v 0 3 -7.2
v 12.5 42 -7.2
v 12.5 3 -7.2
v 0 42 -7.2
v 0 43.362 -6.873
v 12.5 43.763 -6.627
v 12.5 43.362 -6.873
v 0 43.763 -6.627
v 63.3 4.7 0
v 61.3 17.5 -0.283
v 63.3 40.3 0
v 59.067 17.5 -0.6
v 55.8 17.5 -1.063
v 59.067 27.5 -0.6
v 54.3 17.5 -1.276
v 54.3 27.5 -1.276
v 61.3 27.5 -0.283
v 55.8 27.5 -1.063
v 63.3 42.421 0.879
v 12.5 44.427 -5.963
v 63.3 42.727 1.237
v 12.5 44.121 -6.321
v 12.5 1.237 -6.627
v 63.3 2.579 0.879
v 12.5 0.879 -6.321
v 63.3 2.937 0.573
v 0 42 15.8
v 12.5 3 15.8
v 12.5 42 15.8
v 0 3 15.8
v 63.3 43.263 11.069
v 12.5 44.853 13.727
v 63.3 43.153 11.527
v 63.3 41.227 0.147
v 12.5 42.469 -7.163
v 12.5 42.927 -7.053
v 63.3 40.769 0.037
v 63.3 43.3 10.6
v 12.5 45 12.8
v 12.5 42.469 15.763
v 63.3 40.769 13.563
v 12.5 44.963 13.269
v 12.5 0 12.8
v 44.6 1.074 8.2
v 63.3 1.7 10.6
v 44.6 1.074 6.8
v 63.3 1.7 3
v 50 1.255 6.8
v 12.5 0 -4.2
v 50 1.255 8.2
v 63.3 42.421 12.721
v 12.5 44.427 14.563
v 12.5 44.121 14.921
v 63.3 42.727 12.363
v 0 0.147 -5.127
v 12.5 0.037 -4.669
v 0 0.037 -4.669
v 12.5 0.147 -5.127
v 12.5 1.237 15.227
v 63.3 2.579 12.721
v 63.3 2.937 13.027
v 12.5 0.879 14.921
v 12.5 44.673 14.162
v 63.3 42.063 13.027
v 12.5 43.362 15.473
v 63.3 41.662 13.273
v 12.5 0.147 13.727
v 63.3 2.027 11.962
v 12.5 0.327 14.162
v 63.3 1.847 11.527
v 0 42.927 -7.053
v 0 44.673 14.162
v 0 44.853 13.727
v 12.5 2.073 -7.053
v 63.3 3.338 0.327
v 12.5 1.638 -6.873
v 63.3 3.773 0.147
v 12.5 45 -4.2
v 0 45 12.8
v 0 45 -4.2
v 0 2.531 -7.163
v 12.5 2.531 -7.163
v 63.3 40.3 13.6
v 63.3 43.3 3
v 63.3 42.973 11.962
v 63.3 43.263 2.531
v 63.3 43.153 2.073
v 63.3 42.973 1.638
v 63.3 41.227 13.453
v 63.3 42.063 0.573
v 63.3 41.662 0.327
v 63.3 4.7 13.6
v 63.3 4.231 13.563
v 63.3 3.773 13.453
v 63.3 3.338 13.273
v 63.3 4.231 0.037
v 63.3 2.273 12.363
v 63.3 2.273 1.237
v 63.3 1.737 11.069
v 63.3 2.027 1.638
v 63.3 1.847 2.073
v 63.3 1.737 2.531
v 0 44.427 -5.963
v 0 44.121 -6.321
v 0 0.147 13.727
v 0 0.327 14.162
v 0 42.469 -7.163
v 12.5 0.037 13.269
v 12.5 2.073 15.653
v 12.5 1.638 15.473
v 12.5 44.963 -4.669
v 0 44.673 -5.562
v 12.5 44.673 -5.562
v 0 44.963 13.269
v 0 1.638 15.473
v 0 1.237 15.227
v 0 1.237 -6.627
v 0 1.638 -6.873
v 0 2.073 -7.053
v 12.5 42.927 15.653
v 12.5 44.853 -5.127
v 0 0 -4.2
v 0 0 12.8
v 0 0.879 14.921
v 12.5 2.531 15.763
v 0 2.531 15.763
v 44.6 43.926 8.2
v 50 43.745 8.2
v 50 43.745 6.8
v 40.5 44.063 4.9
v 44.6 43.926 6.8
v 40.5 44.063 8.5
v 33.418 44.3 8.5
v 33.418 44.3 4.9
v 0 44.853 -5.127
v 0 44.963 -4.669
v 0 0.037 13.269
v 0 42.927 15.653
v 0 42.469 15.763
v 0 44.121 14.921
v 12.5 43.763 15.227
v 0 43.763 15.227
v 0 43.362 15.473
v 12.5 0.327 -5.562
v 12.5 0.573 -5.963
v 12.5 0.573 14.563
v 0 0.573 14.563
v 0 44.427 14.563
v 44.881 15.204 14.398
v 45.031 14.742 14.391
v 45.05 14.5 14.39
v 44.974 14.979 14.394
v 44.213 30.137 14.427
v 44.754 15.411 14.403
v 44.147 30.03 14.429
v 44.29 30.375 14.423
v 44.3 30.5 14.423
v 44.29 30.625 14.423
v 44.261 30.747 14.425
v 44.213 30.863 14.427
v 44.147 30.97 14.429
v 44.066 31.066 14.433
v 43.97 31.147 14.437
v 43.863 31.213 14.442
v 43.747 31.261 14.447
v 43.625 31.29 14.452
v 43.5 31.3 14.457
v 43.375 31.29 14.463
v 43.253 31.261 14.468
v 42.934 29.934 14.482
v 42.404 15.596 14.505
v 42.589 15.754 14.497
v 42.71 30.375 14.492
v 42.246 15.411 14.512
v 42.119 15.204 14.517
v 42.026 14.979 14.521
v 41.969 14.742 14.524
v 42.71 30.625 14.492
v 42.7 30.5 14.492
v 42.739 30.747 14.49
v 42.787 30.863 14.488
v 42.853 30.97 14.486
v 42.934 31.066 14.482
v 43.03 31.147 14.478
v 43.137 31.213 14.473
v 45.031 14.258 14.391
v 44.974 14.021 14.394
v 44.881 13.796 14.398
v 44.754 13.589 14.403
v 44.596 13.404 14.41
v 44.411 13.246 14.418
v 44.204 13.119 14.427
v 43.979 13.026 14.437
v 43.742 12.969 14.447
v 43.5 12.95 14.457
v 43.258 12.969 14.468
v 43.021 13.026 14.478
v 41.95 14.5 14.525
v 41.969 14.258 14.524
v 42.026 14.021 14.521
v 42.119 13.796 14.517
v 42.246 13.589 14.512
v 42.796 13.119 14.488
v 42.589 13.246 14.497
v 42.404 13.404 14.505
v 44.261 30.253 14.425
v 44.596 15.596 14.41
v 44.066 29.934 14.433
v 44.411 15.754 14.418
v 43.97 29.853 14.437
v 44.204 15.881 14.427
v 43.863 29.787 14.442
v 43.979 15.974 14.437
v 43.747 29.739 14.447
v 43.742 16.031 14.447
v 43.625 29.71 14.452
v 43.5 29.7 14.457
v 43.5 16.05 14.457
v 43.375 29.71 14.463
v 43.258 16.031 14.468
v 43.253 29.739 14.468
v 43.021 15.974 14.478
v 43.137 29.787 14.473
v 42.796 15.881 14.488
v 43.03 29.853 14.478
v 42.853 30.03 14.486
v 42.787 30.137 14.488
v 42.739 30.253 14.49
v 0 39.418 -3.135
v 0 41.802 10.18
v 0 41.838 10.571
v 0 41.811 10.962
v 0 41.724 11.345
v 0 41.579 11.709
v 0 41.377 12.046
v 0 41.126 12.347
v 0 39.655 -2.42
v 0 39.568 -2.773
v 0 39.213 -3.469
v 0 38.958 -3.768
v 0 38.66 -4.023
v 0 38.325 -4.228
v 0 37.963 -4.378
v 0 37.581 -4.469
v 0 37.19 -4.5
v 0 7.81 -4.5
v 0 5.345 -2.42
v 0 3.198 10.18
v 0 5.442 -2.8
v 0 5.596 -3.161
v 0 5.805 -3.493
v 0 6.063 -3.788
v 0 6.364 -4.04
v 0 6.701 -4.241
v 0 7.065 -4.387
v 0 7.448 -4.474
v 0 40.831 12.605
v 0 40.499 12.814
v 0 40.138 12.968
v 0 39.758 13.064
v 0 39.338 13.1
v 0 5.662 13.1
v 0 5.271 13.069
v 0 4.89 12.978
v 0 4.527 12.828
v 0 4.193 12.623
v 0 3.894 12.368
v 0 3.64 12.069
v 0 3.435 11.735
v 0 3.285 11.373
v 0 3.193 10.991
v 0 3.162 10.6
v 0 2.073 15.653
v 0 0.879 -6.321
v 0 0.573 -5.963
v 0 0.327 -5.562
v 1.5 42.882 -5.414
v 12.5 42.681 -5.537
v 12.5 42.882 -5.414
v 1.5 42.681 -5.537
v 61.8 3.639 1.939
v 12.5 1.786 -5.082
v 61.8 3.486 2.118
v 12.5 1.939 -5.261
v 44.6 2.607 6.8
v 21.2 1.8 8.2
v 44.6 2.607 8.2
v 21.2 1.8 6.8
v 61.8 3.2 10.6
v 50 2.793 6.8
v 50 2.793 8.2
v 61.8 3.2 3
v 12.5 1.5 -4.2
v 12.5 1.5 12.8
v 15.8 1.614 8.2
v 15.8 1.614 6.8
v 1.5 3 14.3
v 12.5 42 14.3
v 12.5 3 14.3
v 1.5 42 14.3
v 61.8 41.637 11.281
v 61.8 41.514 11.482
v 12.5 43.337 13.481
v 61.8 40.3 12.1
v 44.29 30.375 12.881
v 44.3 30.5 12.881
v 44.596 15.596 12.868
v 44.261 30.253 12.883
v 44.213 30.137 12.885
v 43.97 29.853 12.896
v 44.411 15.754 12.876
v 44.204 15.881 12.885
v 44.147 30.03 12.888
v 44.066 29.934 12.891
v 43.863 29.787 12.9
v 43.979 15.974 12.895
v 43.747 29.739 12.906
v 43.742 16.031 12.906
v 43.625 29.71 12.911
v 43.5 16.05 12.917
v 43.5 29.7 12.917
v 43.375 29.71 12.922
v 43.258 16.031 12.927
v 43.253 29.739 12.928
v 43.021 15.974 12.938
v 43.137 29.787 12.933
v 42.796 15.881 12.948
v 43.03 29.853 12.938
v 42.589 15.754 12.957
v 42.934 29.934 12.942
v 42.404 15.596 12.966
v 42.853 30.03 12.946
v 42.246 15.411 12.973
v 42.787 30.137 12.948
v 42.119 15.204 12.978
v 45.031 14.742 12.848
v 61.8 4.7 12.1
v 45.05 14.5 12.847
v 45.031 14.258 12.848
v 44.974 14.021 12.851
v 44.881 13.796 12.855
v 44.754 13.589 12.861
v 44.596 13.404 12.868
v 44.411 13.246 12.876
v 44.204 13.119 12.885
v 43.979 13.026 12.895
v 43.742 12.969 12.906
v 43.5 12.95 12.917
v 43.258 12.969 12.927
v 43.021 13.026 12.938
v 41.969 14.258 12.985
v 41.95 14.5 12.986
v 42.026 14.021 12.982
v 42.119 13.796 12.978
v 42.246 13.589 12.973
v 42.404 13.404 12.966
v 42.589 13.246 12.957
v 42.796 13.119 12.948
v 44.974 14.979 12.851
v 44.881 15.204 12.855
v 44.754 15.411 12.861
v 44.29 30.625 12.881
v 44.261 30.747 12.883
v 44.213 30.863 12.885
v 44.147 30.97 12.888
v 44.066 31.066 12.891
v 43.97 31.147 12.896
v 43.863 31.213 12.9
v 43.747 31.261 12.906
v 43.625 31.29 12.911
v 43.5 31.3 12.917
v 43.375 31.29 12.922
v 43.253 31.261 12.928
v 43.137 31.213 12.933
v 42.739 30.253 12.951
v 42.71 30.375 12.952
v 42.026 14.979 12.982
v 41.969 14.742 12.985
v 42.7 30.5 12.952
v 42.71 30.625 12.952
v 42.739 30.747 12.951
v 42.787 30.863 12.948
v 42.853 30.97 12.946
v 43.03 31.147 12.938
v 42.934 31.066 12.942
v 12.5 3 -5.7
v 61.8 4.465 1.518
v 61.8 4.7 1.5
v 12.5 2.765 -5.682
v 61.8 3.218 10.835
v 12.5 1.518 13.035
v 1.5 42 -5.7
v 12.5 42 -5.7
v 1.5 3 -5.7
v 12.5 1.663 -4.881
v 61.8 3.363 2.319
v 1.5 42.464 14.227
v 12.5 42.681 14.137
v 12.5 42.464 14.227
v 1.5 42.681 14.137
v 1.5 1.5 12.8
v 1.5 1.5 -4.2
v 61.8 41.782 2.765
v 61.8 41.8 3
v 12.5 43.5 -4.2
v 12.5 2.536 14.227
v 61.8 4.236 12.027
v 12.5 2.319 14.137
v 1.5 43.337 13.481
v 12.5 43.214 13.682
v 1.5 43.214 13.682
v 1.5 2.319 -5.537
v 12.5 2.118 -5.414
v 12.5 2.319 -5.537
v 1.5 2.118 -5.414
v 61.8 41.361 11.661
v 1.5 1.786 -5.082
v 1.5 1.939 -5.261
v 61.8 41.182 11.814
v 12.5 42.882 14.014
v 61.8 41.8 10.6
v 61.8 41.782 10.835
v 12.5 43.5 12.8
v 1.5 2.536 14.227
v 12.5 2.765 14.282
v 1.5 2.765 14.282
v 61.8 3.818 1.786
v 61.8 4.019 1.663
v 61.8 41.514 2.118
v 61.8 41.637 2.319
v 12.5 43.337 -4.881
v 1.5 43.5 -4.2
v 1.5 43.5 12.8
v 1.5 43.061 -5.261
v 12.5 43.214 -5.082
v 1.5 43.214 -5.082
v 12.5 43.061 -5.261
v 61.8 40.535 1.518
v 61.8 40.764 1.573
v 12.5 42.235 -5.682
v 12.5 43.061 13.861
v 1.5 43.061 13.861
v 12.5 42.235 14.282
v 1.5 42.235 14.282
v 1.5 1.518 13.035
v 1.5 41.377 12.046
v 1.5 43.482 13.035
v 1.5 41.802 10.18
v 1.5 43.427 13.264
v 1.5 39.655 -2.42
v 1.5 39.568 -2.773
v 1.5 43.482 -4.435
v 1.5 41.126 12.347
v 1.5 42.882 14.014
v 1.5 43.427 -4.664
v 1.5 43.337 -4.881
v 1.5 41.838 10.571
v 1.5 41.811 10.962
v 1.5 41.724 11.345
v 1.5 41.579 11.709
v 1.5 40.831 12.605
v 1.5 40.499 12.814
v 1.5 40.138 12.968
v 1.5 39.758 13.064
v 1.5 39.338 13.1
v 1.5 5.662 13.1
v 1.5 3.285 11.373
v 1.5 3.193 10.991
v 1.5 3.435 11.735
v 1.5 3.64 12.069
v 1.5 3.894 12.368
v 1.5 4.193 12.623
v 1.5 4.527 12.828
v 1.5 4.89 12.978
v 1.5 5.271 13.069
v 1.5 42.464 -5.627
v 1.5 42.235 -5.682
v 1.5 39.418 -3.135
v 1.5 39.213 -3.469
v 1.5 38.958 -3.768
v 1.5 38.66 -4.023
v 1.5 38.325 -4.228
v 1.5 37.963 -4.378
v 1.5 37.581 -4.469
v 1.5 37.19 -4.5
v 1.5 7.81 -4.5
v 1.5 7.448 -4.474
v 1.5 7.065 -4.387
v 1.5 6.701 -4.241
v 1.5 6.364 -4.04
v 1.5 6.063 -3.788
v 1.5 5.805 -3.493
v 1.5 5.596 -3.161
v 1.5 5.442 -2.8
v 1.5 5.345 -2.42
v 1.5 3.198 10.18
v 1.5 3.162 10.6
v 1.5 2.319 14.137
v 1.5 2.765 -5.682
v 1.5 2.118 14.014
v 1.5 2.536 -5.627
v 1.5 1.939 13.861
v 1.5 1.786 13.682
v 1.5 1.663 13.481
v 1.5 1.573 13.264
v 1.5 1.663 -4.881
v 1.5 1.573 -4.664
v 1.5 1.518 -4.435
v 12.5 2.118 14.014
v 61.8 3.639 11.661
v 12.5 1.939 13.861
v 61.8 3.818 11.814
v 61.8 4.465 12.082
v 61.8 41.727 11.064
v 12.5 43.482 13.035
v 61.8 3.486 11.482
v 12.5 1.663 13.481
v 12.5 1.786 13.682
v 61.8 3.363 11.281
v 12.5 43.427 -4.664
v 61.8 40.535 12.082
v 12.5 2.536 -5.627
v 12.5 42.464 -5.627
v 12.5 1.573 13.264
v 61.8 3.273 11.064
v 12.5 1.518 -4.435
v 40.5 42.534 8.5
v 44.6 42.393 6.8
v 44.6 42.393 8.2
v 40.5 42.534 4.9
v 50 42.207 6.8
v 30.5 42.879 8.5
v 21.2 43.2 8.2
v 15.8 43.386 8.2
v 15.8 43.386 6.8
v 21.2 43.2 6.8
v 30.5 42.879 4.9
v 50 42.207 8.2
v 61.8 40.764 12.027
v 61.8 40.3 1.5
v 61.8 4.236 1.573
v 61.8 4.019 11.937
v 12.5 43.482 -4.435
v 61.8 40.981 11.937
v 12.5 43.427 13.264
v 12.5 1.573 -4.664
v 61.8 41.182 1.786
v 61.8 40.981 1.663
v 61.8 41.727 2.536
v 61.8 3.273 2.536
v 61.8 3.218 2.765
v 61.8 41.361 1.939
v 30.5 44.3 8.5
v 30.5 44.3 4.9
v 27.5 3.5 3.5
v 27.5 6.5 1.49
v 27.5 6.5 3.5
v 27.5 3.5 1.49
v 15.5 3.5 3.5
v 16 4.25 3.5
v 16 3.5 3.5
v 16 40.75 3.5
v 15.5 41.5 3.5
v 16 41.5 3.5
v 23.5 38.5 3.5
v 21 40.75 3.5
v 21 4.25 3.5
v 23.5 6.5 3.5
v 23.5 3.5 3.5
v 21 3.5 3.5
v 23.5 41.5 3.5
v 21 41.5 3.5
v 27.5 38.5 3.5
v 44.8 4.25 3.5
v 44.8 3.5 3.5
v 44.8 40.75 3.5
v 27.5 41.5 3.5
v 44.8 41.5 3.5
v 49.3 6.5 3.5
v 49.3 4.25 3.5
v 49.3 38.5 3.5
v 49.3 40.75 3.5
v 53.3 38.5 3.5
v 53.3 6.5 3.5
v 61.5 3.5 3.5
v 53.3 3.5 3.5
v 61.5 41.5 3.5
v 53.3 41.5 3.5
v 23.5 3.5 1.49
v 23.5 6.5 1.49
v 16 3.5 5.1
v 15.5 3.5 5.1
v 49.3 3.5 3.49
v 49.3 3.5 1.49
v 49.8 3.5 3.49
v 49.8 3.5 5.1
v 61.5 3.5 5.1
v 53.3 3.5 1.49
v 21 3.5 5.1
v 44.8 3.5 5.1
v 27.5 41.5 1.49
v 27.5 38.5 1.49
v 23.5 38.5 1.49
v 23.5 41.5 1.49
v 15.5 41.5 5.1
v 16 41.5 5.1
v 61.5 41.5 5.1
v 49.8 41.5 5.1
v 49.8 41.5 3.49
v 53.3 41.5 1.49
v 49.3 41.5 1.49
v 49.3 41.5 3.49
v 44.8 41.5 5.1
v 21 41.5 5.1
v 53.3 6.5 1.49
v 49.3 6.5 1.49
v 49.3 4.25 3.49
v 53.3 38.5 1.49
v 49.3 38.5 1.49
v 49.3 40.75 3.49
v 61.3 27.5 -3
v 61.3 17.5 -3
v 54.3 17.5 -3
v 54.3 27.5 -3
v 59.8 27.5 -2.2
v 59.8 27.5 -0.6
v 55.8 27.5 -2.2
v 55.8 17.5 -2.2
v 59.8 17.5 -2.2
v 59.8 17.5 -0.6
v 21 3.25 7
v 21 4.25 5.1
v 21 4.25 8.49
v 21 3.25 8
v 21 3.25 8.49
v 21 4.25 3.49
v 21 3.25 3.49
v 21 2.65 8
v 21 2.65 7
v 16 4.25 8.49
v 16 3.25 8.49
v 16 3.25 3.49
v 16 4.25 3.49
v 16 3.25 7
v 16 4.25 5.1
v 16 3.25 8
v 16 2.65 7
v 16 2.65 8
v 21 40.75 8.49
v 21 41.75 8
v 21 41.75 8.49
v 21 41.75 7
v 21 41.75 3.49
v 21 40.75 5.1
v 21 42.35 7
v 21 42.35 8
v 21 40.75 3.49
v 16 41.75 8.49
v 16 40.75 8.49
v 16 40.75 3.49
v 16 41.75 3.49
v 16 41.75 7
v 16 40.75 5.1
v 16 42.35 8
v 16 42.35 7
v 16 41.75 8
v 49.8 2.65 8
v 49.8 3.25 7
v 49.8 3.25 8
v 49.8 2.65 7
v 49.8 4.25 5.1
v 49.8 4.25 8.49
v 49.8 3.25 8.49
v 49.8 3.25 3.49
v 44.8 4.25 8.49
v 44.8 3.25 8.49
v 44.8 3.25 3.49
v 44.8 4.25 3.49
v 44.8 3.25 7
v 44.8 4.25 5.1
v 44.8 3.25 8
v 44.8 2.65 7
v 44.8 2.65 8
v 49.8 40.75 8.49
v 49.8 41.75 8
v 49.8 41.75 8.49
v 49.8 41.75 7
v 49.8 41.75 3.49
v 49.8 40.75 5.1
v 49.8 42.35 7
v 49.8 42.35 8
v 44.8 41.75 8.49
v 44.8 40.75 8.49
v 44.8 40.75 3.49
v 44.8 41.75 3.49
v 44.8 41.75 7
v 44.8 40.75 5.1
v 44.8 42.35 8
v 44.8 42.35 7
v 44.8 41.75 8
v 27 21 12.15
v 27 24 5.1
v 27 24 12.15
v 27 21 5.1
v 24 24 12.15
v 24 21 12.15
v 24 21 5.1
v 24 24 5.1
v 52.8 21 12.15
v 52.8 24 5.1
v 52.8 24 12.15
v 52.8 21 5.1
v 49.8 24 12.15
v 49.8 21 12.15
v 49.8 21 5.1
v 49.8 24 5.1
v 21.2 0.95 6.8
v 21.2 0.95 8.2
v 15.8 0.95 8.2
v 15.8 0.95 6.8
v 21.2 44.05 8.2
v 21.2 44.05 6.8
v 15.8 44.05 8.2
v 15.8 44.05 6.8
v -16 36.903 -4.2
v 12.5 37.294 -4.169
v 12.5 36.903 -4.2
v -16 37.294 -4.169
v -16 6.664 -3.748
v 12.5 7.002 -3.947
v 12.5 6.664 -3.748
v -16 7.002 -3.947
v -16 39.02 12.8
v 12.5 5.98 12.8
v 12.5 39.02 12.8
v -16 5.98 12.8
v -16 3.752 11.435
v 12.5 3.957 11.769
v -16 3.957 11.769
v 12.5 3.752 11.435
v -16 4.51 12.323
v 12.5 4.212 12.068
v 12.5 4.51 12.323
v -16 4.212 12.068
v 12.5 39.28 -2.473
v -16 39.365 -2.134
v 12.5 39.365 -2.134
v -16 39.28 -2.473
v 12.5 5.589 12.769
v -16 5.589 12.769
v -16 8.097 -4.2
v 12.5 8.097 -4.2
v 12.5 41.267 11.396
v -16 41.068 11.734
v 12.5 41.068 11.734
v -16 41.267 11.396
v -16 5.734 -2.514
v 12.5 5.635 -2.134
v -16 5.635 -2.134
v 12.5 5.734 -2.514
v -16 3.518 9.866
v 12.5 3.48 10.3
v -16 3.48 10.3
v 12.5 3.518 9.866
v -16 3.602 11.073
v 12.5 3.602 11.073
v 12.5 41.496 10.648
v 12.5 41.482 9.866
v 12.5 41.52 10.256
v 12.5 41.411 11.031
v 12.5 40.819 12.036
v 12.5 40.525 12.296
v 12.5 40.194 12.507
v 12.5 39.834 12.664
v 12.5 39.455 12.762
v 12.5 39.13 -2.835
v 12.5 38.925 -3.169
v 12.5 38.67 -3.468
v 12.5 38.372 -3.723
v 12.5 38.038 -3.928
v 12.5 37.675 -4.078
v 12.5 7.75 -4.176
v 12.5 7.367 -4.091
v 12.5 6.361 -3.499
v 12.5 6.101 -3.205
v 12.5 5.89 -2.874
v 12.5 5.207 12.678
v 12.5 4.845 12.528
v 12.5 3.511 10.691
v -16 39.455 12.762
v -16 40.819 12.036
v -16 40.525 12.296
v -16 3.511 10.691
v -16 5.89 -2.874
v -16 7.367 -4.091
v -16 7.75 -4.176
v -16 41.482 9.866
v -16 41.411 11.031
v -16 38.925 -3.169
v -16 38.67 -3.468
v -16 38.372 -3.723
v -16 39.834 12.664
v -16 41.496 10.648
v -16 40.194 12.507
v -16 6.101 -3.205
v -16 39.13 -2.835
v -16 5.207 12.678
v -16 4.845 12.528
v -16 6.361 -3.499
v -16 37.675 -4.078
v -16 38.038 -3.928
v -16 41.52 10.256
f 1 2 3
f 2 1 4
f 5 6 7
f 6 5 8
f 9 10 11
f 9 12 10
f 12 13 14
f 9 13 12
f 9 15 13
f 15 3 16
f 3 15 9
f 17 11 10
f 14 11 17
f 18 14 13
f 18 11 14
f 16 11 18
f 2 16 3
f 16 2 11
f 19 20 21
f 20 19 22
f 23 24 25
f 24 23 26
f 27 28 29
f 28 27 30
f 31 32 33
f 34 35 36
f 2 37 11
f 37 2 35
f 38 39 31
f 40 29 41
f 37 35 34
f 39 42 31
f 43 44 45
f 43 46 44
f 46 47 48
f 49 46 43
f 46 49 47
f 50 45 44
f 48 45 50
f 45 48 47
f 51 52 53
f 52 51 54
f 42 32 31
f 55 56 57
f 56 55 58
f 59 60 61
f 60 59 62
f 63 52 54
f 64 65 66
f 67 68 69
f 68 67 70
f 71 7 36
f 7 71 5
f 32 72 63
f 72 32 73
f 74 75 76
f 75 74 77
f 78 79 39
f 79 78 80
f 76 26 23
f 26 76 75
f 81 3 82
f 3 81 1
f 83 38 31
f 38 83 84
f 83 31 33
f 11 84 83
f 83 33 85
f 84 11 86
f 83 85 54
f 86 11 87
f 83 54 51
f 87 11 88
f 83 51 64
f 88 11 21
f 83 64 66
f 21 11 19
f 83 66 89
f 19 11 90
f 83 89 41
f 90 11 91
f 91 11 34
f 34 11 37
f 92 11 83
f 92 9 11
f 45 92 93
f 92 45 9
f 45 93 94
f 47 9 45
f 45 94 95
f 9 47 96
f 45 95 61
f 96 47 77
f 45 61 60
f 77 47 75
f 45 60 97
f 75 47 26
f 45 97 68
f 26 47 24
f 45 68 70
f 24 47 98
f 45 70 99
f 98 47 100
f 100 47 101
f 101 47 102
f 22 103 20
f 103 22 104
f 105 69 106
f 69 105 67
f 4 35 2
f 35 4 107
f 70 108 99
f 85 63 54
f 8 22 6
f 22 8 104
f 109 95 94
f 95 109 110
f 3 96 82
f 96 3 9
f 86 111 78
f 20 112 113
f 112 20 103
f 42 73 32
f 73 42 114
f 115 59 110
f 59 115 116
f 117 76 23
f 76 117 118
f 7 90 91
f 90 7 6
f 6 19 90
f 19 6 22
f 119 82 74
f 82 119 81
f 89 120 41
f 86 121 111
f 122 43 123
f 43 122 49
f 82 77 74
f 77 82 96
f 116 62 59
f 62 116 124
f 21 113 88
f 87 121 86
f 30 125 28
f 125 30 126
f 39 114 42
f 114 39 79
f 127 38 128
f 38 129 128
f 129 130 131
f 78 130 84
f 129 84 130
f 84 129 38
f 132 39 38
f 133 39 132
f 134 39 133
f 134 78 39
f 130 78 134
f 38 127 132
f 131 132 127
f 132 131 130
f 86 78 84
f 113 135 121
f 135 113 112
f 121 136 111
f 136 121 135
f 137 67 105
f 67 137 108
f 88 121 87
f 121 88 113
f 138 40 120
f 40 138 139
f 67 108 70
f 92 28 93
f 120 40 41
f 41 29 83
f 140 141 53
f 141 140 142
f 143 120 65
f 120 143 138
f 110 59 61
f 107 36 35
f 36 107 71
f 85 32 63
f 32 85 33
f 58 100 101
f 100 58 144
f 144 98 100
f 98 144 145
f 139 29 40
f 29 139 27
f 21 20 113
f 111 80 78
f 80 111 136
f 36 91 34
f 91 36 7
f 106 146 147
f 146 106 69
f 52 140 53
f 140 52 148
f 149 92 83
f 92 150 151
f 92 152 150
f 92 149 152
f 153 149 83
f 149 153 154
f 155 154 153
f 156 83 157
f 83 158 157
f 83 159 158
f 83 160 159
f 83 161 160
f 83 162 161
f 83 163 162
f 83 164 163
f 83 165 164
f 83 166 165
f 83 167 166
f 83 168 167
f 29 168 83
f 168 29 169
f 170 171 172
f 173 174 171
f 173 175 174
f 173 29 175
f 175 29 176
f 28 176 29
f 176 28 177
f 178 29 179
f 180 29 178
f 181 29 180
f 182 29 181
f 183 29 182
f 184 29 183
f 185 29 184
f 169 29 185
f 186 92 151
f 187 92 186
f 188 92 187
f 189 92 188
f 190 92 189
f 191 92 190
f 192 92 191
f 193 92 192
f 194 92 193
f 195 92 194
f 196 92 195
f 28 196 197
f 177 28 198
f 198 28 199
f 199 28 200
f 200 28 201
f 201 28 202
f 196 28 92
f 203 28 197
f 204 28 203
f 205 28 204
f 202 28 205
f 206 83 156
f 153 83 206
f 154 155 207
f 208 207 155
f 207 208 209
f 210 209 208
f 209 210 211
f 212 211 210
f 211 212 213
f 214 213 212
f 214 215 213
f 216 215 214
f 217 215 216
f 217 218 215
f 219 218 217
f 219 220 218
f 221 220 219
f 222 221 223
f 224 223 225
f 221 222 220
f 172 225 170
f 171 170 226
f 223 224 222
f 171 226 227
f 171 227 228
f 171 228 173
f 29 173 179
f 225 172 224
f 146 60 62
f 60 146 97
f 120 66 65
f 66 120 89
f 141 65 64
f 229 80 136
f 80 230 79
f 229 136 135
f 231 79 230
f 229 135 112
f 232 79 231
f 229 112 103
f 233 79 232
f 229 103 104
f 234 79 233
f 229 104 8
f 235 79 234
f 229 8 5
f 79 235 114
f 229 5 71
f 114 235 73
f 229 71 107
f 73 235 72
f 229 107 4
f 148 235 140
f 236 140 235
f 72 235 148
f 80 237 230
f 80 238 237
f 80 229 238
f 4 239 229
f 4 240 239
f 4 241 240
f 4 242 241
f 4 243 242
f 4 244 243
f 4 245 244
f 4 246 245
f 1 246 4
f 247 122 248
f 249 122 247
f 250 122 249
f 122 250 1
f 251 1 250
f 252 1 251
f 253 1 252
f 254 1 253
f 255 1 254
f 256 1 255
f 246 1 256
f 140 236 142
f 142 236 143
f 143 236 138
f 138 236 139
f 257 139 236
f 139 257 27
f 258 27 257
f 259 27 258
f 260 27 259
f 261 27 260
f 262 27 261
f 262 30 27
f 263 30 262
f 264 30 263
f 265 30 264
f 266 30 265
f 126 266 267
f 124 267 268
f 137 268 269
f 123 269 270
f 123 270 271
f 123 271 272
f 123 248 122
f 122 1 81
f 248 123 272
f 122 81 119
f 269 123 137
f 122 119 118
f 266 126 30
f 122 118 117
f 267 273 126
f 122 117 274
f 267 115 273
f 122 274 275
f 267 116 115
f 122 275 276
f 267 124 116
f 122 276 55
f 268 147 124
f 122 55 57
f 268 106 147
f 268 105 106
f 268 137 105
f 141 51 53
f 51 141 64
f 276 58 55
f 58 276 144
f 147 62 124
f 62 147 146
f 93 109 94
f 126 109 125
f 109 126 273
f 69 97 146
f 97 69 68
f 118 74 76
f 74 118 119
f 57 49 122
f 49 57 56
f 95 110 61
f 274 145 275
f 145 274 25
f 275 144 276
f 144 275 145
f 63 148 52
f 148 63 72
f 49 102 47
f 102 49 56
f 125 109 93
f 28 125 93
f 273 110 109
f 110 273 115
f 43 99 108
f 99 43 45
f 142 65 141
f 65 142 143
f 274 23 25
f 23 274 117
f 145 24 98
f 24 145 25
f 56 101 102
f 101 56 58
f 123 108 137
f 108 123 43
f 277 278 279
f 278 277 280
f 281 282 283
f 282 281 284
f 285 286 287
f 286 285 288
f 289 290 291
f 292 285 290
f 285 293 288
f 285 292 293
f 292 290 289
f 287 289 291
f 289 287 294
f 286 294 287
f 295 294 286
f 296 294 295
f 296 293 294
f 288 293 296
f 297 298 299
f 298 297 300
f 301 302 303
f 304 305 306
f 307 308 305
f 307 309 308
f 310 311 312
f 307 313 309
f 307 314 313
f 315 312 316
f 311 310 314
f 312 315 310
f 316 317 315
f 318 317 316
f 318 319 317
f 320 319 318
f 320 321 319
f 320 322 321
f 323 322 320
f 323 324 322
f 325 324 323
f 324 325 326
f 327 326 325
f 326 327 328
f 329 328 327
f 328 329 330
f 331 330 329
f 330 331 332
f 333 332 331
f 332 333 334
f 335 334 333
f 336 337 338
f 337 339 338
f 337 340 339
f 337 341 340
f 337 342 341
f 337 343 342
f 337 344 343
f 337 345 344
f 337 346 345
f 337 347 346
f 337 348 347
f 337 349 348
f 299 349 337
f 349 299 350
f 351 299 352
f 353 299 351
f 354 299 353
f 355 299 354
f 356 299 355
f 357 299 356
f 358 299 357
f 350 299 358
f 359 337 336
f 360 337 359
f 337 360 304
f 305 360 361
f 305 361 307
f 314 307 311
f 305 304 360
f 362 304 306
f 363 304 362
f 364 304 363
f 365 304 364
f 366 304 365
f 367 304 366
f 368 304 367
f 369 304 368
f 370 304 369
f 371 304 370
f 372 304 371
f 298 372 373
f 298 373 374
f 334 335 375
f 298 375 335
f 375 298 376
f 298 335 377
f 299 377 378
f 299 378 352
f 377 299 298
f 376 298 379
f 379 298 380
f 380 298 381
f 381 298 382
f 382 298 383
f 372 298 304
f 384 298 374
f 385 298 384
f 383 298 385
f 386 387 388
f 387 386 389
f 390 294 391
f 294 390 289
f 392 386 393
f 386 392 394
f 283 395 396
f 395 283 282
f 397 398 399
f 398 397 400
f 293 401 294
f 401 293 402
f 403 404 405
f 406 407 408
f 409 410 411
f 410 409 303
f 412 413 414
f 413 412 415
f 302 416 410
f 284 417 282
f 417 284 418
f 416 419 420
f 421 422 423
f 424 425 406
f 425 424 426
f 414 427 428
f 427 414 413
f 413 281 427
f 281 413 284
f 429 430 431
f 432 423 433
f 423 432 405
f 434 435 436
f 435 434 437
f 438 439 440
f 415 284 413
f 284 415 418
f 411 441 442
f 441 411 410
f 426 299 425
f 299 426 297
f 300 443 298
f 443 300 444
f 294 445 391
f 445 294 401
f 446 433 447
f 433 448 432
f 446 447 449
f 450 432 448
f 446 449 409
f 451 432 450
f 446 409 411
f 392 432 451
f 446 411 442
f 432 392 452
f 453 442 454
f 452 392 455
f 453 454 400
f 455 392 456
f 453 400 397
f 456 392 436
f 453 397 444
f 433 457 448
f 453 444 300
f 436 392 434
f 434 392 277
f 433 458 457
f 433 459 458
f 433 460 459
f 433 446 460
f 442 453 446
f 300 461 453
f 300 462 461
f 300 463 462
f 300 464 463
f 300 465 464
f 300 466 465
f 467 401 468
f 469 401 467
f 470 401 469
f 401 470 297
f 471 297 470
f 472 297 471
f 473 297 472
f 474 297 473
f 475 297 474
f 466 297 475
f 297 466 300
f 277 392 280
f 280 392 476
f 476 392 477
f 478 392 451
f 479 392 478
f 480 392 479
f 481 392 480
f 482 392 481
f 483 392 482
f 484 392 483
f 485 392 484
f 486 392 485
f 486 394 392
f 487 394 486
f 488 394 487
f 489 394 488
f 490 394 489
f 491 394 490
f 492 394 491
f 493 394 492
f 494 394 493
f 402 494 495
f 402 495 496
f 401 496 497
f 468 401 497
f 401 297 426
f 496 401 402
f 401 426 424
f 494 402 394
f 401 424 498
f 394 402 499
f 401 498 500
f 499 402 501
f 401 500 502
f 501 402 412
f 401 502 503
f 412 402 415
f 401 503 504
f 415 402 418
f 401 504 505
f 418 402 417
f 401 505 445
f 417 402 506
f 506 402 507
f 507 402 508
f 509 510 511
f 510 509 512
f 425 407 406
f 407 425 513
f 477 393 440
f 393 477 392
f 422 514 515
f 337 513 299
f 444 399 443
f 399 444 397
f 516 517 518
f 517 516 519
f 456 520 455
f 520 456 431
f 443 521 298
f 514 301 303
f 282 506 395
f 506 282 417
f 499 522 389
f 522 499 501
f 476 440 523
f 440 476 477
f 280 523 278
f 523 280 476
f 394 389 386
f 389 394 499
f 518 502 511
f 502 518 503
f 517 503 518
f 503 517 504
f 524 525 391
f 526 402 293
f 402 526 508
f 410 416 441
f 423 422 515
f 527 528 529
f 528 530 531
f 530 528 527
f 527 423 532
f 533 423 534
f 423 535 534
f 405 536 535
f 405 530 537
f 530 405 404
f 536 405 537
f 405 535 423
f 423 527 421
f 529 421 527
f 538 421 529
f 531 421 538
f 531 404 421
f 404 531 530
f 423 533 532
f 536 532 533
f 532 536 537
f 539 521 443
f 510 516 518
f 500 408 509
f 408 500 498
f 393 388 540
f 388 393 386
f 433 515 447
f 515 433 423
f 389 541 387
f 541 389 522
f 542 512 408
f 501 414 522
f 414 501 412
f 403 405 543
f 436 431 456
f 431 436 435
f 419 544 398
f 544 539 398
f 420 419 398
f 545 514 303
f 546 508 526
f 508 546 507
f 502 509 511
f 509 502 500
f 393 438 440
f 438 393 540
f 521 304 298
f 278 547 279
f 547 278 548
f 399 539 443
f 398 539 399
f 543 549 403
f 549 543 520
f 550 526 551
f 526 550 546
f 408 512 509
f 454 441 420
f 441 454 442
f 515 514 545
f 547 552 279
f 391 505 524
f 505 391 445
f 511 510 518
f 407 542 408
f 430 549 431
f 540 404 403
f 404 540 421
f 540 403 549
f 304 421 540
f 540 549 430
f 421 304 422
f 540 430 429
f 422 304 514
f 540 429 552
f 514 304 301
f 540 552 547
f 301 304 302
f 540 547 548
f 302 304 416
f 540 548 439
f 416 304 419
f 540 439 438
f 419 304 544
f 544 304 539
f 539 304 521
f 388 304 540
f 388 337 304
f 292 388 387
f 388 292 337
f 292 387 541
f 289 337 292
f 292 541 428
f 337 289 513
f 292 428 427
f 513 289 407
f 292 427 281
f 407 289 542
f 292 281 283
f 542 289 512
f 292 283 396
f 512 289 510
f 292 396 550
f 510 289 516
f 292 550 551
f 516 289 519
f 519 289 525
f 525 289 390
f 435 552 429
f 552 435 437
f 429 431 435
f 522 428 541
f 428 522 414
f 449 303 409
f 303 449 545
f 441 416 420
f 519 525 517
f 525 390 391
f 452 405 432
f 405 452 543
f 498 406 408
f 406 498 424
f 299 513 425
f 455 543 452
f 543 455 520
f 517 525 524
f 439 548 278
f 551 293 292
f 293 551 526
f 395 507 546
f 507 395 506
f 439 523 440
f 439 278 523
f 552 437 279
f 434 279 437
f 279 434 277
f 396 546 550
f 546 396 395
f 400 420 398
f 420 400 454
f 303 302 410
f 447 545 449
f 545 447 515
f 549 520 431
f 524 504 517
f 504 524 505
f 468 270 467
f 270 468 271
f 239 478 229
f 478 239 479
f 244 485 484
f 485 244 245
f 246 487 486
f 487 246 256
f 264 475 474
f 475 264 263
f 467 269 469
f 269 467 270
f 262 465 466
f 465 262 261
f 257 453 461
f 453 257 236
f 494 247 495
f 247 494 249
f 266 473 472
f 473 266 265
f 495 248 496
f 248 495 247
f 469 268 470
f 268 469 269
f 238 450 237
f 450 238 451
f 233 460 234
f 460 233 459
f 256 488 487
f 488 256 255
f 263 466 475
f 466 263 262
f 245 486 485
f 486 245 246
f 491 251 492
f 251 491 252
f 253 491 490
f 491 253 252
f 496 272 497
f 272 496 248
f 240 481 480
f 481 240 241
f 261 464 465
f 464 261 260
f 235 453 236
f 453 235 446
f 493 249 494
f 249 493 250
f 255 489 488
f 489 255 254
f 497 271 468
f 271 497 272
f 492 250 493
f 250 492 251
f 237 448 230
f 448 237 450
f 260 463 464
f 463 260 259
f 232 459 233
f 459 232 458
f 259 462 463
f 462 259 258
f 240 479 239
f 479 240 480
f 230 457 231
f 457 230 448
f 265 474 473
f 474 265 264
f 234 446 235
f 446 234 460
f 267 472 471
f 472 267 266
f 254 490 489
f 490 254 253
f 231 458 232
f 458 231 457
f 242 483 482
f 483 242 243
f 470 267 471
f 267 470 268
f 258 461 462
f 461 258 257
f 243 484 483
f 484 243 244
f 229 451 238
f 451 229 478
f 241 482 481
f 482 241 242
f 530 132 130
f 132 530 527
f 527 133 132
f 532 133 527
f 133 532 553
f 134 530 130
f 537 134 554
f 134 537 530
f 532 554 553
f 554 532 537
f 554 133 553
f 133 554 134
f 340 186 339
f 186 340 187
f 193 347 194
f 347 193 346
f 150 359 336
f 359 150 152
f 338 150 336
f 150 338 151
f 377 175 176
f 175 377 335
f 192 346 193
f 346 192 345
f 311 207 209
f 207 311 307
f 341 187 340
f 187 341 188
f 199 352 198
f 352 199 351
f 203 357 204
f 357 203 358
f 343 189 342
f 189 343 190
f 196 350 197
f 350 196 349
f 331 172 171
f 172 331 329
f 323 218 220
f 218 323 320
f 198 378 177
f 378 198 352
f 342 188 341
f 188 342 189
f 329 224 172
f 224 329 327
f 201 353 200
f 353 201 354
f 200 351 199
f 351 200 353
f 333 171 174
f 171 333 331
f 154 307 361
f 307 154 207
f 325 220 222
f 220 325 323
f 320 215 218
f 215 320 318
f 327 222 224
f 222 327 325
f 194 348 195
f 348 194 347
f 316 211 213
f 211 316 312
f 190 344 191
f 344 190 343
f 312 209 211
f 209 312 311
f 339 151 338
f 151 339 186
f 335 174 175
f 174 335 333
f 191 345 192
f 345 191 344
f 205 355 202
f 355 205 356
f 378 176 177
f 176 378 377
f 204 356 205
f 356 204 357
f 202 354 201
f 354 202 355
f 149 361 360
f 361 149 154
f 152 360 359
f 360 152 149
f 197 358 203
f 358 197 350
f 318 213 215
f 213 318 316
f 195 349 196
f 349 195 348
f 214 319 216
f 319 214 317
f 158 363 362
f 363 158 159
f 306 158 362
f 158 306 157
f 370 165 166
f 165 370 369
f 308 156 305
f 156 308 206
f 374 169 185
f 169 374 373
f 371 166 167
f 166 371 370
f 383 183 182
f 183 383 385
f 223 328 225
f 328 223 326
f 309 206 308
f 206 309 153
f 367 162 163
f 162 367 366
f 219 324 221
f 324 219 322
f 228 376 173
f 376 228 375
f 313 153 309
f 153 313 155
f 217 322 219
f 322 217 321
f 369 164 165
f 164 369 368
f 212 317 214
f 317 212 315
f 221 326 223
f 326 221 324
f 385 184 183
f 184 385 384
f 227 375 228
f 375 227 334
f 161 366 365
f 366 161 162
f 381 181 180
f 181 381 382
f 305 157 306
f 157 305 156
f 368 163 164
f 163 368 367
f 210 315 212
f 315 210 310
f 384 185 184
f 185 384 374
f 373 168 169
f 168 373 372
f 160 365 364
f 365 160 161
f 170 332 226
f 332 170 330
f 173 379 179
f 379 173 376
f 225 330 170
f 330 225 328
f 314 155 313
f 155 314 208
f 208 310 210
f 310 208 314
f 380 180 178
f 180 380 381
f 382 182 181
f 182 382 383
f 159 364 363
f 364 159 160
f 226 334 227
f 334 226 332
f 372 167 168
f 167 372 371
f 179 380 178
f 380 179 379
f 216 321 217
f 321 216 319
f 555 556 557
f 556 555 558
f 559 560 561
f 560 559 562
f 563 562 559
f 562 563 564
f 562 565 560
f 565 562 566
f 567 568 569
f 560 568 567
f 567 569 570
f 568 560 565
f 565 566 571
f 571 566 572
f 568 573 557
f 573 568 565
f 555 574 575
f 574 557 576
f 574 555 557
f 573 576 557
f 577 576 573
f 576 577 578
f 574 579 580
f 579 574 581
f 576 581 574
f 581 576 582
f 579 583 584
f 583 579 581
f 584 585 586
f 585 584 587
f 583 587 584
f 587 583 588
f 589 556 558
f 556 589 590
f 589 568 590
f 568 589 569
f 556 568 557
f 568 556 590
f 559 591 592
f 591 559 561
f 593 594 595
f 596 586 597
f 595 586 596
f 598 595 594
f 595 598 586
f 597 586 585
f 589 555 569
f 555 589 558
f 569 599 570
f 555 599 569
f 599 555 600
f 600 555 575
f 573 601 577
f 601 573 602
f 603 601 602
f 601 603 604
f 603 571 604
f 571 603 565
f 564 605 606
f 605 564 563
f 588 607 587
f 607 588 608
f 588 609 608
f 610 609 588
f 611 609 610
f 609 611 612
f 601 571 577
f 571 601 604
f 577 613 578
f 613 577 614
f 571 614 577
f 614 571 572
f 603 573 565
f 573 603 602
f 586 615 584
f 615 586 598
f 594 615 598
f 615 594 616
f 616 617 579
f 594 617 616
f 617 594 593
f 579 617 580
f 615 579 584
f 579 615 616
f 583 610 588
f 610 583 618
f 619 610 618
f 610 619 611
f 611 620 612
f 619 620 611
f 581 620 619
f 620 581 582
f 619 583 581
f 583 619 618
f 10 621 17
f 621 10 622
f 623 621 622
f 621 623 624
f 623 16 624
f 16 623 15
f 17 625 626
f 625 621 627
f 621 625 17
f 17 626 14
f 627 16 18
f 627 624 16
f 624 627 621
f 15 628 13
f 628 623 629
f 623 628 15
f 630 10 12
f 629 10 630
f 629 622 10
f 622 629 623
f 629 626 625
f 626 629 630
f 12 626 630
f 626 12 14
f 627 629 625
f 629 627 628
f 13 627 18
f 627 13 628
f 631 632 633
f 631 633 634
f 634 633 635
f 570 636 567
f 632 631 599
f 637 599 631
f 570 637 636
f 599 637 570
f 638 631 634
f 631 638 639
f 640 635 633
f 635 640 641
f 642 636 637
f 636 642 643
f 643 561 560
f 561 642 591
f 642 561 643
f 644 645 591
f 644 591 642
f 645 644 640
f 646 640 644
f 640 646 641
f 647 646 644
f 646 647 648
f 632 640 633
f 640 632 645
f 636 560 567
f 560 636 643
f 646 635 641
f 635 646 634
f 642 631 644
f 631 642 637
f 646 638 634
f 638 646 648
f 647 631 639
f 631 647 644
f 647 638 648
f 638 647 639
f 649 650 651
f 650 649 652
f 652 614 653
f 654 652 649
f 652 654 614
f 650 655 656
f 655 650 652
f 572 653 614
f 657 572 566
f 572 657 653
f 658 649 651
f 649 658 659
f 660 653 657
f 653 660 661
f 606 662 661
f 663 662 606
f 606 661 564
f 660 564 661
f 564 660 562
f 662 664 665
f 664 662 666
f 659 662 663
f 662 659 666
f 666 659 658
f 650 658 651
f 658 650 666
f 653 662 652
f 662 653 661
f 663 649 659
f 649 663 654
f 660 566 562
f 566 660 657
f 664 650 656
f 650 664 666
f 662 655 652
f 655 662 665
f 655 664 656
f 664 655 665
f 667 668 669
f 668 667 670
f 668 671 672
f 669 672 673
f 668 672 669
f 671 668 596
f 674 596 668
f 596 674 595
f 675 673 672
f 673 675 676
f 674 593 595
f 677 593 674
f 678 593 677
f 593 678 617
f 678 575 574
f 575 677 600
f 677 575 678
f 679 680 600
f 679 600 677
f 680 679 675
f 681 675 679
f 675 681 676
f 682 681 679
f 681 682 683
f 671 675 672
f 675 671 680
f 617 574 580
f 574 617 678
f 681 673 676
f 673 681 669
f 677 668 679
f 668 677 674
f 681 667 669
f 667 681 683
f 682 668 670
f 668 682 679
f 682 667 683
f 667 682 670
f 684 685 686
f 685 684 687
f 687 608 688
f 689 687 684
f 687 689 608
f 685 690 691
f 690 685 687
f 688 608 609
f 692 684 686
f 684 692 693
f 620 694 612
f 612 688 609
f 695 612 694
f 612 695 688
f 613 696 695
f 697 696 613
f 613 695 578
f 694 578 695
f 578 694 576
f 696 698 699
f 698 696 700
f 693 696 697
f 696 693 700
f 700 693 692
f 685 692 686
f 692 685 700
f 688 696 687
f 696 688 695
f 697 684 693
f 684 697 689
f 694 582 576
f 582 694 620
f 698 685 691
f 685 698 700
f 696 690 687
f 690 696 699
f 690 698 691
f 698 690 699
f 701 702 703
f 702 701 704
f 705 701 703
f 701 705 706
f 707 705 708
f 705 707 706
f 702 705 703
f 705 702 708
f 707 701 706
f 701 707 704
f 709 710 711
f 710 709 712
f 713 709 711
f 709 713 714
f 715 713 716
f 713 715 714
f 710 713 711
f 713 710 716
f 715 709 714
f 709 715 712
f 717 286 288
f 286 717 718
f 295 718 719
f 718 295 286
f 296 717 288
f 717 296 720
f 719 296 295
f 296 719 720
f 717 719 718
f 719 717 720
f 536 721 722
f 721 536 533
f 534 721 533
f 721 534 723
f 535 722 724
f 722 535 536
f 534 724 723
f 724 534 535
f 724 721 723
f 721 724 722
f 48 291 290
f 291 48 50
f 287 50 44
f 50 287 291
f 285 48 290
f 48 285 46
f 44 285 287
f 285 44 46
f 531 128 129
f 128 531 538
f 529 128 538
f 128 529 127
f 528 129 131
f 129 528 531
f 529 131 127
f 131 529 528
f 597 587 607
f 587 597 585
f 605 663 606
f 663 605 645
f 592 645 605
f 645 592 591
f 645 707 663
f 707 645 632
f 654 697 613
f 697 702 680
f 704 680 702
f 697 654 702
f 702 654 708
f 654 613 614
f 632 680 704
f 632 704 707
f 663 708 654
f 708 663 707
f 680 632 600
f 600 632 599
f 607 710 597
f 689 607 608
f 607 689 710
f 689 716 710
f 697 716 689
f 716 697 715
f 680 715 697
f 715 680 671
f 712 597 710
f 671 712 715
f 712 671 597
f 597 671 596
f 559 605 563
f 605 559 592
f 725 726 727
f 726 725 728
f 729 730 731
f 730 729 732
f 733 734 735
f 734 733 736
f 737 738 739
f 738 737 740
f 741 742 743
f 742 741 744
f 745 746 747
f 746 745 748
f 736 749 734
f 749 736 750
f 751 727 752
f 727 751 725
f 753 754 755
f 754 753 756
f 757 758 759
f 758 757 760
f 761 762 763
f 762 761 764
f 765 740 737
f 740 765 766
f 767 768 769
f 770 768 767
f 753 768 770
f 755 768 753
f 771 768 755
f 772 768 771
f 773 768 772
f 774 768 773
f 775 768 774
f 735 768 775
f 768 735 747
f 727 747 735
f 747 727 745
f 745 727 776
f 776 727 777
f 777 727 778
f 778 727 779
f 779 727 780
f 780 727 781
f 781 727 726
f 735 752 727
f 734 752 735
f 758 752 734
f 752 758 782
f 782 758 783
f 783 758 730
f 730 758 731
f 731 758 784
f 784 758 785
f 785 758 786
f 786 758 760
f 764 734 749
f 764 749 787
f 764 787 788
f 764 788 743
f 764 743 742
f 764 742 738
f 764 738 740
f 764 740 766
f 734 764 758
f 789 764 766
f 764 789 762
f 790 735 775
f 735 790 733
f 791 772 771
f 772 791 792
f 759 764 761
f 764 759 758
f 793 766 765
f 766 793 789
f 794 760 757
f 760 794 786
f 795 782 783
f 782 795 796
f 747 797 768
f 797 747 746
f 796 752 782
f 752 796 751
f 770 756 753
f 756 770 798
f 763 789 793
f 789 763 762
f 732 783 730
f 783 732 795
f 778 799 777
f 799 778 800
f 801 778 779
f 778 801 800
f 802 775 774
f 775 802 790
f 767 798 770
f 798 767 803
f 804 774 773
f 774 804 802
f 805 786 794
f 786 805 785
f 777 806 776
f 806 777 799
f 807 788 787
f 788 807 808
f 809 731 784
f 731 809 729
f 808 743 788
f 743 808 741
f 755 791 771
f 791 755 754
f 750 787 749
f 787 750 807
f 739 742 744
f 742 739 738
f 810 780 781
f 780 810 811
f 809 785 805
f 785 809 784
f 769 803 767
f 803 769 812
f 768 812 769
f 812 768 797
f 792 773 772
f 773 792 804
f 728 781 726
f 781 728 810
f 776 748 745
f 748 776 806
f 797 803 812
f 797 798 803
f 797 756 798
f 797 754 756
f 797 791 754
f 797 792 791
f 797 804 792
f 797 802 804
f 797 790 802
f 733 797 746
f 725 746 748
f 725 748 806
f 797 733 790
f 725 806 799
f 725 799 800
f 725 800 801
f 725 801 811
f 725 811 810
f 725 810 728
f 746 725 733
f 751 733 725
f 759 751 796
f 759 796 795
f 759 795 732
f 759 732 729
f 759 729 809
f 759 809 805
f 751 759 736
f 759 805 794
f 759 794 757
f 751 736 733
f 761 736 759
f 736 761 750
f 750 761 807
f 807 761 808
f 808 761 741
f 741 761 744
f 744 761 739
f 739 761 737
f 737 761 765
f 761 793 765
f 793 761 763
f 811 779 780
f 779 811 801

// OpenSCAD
part = "assembly";

plug_w      = 39.0;
plug_w_bot  = 33.0;
plug_h      = 17.0;
plug_r      = 2.5;
plug_out    = 16.0;
flange_t    = 3.0;
flange_ext  = 1.2;
plug_body   = 8.0;

pcb_w = 38.0; pcb_l = 46.0; pcb_t = 1.6;
comp_top = 7.0;
under    = 2.0;
ant_len  = 8.0;

wall = 1.5; gap = 0.3; r_out = 3.0;
$fn = 40;

z_pcb_bot = wall + under;
z_pcb_mid = z_pcb_bot + pcb_t / 2;
hb_in = under + pcb_t + comp_top;
wb_in = pcb_w + 2 * gap;
ha_in = plug_h + 2 * flange_ext + 2 * gap;
wa_in = plug_w + 2 * flange_ext + 2 * gap;
la    = wall + flange_t + plug_body;
pcb_x0 = la + 3.0;
l_tot = pcb_x0 + pcb_l + gap + wall;
y_c = max(wa_in, wb_in) / 2 + wall;

module rbox(x0, l, w, h, zc, r) {
    translate([x0, y_c - w/2, zc - h/2])
        hull() for (yy = [r, w - r], zz = [r, h - r]) translate([0, yy, zz]) rotate([0, 90, 0]) cylinder(r = r, h = l);
}

zA = z_pcb_mid;
zB = wall + hb_in / 2;

module outer() {
    hull() {
        rbox(0, la, wa_in + 2*wall, ha_in + 2*wall, zA, r_out);
        rbox(la + 4, l_tot - la - 4, wb_in + 2*wall, hb_in + 2*wall, zB, r_out);
    }
}
module inner() {
    hull() {
        rbox(wall, la - wall, wa_in, ha_in, zA, max(0.6, r_out - wall));
        rbox(la + 4, l_tot - la - 4 - wall, wb_in, hb_in, zB, max(0.6, r_out - wall));
    }
}

module shroud(extra = 0, len = 1) {
    w1 = plug_w + 2*extra; w0 = plug_w_bot + 2*extra; h = plug_h + 2*extra;
    translate([0, y_c, zA]) rotate([90, 0, 90]) linear_extrude(len)
        offset(r = plug_r) offset(delta = -plug_r)
            polygon([[-w0/2, -h/2], [w0/2, -h/2], [w1/2, h/2], [-w1/2, h/2]]);
}

hook_x = [la + 6, l_tot - ant_len - 8];
hook_w = 5; hook_len = 5.0; hook_t = 1.0; barb = 0.6;

module window_cuts() {
    for (x = hook_x, s = [-1, 1])
        translate([x - (hook_w + 0.4)/2, y_c + s * (wb_in/2 + wall/2) - wall, z_pcb_bot + hook_len - 1.7])
            cube([hook_w + 0.4, 2 * wall, 1.4]);
}
module hooks() {
    for (x = hook_x, s = [-1, 1]) {
        yi = y_c + s * (wb_in/2 - hook_t/2 - 0.05);
        translate([x - hook_w/2, yi - hook_t/2, z_pcb_bot - 0.01]) cube([hook_w, hook_t, hook_len]);
        translate([x - hook_w/2, yi + (s > 0 ? hook_t/2 : -hook_t/2 - barb), z_pcb_bot + hook_len - 1.5])
            cube([hook_w, barb, 1.0]);
    }
}
module shell() {
    difference() {
        outer();
        inner();
        translate([-1, 0, 0]) shroud(gap, wall + 2);
        translate([wall, 0, 0]) shroud(flange_ext + gap, flange_t + gap);
        translate([wall + flange_t, 0, 0]) shroud(gap, plug_body + 1);
        translate([pcb_x0 + 20 - 5, y_c + wb_in/2 - 1, z_pcb_bot + pcb_t - 0.2]) cube([10.0, wall + 2, 3.6]);
        translate([pcb_x0 + 28, y_c - 8, z_pcb_bot]) cylinder(d = 3.1, h = 20);
        translate([pcb_x0 + 28, y_c + 8, z_pcb_bot]) cylinder(d = 1.6, h = 20);
    }
}

module pcb_supports() {
    for (x = [pcb_x0 + 10, l_tot - ant_len - 4], s = [-1, 1])
        translate([x - 2, y_c + s * (pcb_w/2 - 1.5) - 1.5, wall - 0.01]) cube([4, 3, under + 0.01]);
}
module hold_downs() {
    for (x = [pcb_x0 + 10, l_tot - ant_len - 4])
        translate([x - 1.5, y_c - 1.5, z_pcb_bot + pcb_t - 0.15]) cube([3, 3, comp_top + 0.2]);
}
module tie_eye() {
    translate([l_tot - 9, y_c - 5, -3]) difference() {
        cube([7, 10, 3.2]);
        translate([1.5, -1, 0.8]) cube([4, 12, 1.6]);
    }
}

module split_box(lower) {
    big = 200;
    if (lower) translate([-50, -50, -50]) cube([big, big, 50 + z_pcb_bot]);
    else       translate([-50, -50, z_pcb_bot]) cube([big, big, big]);
}

module bottom() {
    union() { intersection() { shell(); split_box(true); } pcb_supports(); tie_eye(); hooks(); }
}
module top() {
    difference() {
        union() { intersection() { shell(); split_box(false); } hold_downs(); }
        window_cuts();
    }
}
module pipe() { cylinder(d = 2.9, h = wall + comp_top - 1.0); cylinder(d = 4.0, h = 0.8); }

if (part == "bottom") bottom();
else if (part == "top") translate([0, 0, 0]) rotate([180, 0, 0]) translate([0, 0, -(zB + hb_in/2 + wall)]) top();
else if (part == "pipe") pipe();
else {
    color("#2b2e35") bottom();
    color("#3b404a", 0.55) top();
    color("#1b5e20") translate([pcb_x0, y_c - pcb_w/2, z_pcb_bot]) cube([pcb_l, pcb_w, pcb_t]);
    color("#888") translate([-plug_out, 0, 0]) shroud(0, plug_out + wall + flange_t + plug_body);
}

echo(str("Shell ", l_tot, " (+", plug_out, " plug) x ", 2*y_c, " x ", ha_in + 2*wall, " mm max; PCB zone height ",
         hb_in + 2*wall, " mm"));
